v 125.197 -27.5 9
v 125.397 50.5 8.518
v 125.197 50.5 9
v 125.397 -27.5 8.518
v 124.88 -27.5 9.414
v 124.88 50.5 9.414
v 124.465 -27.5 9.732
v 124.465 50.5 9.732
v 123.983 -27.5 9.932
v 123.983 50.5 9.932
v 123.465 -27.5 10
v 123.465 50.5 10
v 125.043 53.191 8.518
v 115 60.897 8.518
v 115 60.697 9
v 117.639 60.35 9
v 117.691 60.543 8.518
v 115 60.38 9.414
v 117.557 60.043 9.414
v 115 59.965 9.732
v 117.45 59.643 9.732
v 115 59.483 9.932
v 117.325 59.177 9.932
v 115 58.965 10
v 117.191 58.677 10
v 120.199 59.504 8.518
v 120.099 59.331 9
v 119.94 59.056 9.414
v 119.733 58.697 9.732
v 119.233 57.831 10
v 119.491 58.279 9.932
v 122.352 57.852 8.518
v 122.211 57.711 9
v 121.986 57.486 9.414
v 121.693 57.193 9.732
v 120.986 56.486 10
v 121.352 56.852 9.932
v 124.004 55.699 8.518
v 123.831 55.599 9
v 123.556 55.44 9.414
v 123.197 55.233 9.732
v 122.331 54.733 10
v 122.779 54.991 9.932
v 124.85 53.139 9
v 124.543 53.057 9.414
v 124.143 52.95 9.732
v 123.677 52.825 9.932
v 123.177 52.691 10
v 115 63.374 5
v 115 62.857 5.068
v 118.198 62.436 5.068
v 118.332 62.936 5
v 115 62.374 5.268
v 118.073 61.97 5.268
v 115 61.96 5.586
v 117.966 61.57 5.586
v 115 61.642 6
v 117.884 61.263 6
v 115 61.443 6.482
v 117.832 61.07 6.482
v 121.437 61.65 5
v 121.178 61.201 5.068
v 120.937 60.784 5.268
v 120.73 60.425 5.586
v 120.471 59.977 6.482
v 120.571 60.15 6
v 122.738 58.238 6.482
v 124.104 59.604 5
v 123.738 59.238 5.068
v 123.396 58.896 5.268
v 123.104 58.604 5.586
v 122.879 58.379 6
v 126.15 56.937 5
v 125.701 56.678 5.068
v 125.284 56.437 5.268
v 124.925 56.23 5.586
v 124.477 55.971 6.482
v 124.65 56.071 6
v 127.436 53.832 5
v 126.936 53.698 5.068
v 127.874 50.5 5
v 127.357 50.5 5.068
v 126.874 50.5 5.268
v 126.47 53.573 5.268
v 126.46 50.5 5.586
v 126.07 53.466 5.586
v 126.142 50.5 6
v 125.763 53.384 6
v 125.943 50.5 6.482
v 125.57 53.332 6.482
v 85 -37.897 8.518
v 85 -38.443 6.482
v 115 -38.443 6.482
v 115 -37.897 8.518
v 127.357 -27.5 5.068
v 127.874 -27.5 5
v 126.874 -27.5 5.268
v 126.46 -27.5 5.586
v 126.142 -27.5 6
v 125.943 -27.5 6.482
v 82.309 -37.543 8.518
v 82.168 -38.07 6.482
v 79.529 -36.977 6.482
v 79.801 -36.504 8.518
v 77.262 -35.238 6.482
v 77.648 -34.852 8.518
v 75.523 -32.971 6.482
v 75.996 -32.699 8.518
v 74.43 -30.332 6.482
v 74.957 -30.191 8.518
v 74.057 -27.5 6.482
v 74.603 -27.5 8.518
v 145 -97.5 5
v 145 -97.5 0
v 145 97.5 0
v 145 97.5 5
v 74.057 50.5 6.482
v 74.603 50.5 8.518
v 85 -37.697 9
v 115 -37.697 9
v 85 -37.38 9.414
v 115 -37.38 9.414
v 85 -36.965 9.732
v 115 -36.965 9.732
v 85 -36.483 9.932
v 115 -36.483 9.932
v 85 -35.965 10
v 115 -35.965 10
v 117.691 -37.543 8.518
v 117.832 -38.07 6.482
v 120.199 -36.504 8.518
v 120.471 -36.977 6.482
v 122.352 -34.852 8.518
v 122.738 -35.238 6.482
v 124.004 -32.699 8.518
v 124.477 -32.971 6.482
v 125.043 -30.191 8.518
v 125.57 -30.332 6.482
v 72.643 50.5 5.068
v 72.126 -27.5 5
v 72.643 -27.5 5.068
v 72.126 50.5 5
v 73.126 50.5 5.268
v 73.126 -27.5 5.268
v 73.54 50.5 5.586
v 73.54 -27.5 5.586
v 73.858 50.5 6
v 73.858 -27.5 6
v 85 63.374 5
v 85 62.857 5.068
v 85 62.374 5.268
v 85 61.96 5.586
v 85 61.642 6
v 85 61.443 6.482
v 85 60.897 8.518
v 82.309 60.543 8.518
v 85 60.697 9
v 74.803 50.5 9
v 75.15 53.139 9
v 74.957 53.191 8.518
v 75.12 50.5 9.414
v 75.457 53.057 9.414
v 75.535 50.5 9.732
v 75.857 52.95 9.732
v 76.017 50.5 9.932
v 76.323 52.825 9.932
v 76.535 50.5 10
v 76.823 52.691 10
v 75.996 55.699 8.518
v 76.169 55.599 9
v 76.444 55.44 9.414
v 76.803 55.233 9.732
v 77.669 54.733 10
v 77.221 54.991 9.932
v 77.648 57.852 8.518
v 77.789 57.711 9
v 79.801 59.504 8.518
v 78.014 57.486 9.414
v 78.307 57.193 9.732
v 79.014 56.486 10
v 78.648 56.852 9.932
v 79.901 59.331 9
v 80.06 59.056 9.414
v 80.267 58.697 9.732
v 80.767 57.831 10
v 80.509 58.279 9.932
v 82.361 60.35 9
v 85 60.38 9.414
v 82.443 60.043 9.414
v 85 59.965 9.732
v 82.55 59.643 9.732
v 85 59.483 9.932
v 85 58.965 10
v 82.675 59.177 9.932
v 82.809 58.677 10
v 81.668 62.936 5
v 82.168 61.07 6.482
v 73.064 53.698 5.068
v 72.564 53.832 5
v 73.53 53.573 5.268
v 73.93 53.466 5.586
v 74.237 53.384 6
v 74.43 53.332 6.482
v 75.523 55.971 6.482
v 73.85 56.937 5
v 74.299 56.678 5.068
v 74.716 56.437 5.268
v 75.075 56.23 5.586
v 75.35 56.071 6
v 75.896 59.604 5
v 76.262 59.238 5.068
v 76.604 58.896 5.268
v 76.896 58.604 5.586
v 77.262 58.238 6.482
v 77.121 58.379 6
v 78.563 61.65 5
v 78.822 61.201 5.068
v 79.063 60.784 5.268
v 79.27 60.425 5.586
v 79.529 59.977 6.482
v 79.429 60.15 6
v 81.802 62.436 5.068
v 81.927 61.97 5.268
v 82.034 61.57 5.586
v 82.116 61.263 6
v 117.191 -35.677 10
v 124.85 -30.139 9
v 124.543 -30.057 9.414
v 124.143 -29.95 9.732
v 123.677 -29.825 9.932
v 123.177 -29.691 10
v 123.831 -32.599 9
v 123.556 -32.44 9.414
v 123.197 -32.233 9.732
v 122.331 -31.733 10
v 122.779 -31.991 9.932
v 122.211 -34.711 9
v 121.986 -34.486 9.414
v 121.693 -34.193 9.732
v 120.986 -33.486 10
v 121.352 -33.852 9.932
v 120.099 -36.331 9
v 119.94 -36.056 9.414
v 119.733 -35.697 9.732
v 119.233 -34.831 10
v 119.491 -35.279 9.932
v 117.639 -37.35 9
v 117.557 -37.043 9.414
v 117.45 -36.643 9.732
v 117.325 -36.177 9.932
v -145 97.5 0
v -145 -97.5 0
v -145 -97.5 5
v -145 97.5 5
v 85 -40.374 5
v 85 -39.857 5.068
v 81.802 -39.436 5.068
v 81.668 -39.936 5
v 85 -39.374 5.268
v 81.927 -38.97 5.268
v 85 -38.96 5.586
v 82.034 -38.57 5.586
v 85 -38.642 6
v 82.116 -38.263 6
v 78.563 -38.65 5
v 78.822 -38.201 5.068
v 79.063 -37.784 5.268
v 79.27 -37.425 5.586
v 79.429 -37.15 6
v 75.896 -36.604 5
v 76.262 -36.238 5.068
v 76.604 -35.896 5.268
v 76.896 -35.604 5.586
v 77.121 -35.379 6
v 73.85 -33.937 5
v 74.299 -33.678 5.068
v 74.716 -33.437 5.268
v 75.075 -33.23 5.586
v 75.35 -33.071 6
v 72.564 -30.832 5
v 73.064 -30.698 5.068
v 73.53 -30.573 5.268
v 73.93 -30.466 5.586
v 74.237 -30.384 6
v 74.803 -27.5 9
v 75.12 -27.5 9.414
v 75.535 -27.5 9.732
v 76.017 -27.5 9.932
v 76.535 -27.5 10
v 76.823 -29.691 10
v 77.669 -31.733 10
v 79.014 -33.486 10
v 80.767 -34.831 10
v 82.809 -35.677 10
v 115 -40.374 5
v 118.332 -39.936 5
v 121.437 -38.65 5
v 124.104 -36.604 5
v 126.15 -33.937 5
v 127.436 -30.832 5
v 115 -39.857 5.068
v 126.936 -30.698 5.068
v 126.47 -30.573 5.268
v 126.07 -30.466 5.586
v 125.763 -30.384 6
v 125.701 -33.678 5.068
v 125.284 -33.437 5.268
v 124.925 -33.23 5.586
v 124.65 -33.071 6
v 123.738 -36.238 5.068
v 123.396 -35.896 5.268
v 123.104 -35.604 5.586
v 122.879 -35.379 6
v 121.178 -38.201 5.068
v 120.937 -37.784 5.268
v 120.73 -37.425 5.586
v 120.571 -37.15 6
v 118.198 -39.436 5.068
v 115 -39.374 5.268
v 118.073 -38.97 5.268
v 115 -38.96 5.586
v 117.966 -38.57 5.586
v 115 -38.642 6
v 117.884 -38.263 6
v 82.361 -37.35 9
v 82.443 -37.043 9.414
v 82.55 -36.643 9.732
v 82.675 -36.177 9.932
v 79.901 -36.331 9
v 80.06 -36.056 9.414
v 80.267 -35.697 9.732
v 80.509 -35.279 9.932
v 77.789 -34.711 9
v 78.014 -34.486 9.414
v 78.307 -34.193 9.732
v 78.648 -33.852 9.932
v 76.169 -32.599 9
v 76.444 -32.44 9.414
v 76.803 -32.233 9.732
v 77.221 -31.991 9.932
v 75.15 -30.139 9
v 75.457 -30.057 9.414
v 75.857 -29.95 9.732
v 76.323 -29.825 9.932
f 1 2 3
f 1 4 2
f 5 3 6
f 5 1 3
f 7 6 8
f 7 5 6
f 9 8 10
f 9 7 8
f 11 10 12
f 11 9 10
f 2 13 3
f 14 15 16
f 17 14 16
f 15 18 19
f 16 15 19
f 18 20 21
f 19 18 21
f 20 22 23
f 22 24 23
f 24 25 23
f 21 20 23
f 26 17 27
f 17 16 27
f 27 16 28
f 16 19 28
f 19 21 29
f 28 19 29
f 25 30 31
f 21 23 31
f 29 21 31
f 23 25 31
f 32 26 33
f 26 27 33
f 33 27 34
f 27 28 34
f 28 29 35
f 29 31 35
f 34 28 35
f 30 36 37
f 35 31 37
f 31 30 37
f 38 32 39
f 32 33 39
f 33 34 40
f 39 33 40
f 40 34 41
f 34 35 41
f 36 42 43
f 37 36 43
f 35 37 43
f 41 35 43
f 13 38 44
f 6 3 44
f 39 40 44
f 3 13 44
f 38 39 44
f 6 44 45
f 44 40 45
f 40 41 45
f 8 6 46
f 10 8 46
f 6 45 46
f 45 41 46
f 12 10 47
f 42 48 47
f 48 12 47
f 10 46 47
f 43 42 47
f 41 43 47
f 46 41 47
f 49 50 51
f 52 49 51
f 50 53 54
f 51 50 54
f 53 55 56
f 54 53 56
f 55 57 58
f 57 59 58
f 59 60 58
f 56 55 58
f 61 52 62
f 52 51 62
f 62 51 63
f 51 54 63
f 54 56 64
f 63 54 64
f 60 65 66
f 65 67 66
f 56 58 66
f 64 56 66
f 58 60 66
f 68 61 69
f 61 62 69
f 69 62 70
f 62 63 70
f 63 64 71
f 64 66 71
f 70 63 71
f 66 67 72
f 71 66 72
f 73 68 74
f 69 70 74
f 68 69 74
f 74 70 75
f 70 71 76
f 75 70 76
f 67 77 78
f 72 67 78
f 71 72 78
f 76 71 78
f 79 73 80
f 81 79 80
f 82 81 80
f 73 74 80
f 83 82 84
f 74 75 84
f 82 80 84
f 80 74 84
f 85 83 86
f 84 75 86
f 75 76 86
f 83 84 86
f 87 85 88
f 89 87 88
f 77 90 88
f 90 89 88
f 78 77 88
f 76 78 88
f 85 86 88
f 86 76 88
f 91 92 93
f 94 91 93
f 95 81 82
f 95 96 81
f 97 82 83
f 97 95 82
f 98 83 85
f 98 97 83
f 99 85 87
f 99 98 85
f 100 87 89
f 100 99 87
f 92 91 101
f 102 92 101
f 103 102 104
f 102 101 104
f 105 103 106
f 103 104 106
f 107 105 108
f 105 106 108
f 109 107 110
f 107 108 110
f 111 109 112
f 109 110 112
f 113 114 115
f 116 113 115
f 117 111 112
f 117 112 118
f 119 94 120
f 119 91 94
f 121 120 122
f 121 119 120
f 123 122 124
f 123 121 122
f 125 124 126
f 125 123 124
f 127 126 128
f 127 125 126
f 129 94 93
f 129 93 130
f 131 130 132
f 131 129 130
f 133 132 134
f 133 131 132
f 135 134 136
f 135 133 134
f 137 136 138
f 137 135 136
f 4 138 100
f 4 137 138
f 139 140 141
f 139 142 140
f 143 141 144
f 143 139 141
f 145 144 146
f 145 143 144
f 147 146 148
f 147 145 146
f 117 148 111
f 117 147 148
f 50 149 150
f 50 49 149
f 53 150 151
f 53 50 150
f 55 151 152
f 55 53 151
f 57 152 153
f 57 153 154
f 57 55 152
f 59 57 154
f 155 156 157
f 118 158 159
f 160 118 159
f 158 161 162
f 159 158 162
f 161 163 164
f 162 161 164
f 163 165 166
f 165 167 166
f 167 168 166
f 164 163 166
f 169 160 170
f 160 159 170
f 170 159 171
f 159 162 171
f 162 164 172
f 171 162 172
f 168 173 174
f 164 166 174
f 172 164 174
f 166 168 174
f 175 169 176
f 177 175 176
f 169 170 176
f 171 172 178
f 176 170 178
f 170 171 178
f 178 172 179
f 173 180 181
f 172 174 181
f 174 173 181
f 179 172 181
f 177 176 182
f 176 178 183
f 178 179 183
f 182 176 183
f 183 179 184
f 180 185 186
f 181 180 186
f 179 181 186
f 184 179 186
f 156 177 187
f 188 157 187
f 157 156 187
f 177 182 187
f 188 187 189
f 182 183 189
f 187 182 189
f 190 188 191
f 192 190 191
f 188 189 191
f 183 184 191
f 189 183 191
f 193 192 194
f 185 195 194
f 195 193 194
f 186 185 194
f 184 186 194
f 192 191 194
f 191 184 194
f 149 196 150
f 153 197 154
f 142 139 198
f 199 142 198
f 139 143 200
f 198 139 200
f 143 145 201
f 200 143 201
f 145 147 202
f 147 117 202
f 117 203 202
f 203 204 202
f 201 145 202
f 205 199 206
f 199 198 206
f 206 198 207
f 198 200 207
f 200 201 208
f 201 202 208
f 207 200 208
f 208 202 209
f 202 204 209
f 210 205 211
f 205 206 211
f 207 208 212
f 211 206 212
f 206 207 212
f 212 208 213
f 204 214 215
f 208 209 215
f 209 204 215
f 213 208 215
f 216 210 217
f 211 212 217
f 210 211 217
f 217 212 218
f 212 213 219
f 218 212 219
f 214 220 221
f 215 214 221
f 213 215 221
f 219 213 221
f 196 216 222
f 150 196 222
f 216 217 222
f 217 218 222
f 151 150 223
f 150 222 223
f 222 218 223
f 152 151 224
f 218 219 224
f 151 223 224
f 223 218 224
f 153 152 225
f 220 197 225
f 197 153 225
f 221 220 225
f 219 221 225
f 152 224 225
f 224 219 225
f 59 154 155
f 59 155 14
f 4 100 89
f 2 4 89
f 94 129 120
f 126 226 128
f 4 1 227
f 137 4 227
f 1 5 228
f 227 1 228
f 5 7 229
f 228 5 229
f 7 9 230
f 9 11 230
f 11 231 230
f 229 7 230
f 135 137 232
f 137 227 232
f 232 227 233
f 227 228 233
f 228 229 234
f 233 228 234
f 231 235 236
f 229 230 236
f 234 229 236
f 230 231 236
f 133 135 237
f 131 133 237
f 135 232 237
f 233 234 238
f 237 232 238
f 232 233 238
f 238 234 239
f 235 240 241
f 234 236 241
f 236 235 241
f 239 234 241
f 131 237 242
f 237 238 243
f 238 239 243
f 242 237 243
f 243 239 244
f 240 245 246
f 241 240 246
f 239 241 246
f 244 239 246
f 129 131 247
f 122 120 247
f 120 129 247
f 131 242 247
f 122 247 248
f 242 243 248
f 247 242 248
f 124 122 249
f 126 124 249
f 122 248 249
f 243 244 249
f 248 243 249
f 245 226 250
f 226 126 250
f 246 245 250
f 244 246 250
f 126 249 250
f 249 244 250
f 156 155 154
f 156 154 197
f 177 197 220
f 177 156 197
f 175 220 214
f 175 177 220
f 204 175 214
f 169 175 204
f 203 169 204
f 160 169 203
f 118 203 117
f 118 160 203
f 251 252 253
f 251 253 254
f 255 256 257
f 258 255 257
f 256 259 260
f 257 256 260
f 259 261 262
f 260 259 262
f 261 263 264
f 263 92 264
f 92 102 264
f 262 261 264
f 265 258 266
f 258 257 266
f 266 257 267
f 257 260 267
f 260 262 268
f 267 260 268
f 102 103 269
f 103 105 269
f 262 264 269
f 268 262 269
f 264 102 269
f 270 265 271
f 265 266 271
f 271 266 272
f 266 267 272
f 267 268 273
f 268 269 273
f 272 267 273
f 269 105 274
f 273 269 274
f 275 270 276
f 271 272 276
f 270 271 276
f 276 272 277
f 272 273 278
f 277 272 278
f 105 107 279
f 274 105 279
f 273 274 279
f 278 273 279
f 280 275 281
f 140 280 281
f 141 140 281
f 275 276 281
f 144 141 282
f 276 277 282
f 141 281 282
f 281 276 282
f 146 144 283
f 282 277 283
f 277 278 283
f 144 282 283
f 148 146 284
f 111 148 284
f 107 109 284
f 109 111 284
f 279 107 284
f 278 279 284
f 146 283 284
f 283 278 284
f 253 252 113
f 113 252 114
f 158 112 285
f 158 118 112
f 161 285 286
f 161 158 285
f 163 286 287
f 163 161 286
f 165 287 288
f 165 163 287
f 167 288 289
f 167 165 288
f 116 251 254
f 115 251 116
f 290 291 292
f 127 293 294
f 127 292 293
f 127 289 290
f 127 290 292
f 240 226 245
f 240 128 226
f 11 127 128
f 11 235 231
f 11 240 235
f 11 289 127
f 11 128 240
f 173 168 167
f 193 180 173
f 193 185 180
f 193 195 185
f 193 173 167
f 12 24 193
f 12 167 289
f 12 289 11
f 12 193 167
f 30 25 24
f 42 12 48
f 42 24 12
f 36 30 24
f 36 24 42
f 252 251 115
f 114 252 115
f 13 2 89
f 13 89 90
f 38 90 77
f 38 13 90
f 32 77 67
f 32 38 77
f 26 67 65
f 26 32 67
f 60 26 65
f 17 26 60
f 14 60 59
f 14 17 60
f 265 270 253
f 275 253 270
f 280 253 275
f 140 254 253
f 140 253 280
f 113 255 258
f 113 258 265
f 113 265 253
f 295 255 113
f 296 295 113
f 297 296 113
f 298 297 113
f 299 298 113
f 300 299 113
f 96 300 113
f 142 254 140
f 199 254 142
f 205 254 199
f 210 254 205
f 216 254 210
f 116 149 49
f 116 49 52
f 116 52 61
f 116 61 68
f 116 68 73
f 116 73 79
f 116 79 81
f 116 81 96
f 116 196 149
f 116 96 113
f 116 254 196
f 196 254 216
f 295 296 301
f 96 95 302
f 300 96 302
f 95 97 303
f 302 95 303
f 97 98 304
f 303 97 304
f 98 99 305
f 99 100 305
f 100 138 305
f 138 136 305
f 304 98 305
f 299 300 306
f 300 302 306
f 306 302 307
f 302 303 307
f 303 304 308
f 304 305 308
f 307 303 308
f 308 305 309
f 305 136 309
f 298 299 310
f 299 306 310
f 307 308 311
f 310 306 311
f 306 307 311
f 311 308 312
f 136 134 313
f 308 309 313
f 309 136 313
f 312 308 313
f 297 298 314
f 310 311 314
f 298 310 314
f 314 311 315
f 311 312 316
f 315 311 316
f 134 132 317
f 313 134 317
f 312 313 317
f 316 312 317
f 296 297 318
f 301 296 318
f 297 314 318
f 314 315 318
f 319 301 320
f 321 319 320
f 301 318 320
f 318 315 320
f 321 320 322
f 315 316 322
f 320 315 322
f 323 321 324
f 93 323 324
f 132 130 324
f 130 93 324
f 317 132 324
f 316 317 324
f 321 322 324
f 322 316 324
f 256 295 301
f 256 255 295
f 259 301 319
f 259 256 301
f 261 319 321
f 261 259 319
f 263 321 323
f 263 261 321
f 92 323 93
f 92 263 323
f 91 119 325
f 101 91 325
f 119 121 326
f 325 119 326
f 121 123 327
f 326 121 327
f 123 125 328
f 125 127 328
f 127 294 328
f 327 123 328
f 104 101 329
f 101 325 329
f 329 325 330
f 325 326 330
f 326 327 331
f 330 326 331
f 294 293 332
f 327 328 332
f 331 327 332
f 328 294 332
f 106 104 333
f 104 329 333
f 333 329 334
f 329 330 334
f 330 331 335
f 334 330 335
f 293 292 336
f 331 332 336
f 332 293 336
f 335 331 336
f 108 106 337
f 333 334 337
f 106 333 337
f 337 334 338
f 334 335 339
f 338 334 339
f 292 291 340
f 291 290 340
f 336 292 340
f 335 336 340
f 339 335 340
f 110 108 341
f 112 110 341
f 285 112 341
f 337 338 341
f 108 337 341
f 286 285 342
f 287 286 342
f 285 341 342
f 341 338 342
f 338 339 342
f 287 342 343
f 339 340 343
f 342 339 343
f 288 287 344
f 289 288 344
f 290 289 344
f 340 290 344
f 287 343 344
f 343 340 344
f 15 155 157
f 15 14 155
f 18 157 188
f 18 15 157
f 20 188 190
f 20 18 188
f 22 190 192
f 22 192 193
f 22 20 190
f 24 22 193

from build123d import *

# Parameters (mm, degrees)
SKETCH_1_W      = 290
SKETCH_1_H      = 195
EXTRUDE_1_DEPTH = 5
SKETCH_2_W      = 50
SKETCH_2_H      = 98
EXTRUDE_2_DEPTH = 5
FILLET_1_R      = 10
DRAFT_1_ANGLE   = 15
FILLET_2_R      = 2


with BuildPart() as part:
    # 草图1 → 凸台-拉伸1 (new body)
    with BuildSketch(Plane.XY):
        Rectangle(SKETCH_1_W, SKETCH_1_H)
    extrude(amount=EXTRUDE_1_DEPTH)

    # 草图2 → 凸台-拉伸2 (add)
    with BuildSketch(Plane.XY.offset(5)):
        with Locations((100, 11.5)):
            Rectangle(SKETCH_2_W, SKETCH_2_H)
    extrude(amount=EXTRUDE_2_DEPTH)

    # 圆角1
    fillet_1_edges = [part.edges().sort_by_distance(p)[0] for p in [
        (125, -37.5, 7.5),
        (125, 60.5, 7.5),
        (75, 60.5, 7.5),
        (75, -37.5, 7.5),
    ]]
    fillet(fillet_1_edges, radius=FILLET_1_R)

    # 拔模1
    draft_1_faces = [part.faces().sort_by_distance(p)[0] for p in [
        (75, 11.5, 7.5),
        (77.928932188, 57.571067812, 7.5),
        (100, 60.5, 7.5),
        (122.071067812, 57.571067812, 7.5),
        (125, 11.5, 7.5),
        (122.071067812, -34.571067812, 7.5),
        (100, -37.5, 7.5),
        (77.928932188, -34.571067812, 7.5),
    ]]
    draft(draft_1_faces, Plane.XY.offset(10), DRAFT_1_ANGLE)

    # 圆角2
    fillet_2_edges = [part.edges().sort_by_distance(p)[0] for p in [
        (100, 61.839745962, 5),
        (100, 60.5, 10),
        (126.339745962, 11.5, 5),
        (125, 11.5, 10),
        (75, 11.5, 10),
        (100, -37.5, 10),
        (77.928932188, -34.571067812, 10),
        (122.071067812, -34.571067812, 10),
        (77.928932188, 57.571067812, 10),
        (122.071067812, 57.571067812, 10),
        (73.660254038, 11.5, 5),
        (100, -38.839745962, 5),
        (123.018411267, 58.518411267, 5),
        (76.981588733, 58.518411267, 5),
        (123.018411267, -35.518411267, 5),
        (76.981588733, -35.518411267, 5),
    ]]
    fillet(fillet_2_edges, radius=FILLET_2_R)


solid = part.part
